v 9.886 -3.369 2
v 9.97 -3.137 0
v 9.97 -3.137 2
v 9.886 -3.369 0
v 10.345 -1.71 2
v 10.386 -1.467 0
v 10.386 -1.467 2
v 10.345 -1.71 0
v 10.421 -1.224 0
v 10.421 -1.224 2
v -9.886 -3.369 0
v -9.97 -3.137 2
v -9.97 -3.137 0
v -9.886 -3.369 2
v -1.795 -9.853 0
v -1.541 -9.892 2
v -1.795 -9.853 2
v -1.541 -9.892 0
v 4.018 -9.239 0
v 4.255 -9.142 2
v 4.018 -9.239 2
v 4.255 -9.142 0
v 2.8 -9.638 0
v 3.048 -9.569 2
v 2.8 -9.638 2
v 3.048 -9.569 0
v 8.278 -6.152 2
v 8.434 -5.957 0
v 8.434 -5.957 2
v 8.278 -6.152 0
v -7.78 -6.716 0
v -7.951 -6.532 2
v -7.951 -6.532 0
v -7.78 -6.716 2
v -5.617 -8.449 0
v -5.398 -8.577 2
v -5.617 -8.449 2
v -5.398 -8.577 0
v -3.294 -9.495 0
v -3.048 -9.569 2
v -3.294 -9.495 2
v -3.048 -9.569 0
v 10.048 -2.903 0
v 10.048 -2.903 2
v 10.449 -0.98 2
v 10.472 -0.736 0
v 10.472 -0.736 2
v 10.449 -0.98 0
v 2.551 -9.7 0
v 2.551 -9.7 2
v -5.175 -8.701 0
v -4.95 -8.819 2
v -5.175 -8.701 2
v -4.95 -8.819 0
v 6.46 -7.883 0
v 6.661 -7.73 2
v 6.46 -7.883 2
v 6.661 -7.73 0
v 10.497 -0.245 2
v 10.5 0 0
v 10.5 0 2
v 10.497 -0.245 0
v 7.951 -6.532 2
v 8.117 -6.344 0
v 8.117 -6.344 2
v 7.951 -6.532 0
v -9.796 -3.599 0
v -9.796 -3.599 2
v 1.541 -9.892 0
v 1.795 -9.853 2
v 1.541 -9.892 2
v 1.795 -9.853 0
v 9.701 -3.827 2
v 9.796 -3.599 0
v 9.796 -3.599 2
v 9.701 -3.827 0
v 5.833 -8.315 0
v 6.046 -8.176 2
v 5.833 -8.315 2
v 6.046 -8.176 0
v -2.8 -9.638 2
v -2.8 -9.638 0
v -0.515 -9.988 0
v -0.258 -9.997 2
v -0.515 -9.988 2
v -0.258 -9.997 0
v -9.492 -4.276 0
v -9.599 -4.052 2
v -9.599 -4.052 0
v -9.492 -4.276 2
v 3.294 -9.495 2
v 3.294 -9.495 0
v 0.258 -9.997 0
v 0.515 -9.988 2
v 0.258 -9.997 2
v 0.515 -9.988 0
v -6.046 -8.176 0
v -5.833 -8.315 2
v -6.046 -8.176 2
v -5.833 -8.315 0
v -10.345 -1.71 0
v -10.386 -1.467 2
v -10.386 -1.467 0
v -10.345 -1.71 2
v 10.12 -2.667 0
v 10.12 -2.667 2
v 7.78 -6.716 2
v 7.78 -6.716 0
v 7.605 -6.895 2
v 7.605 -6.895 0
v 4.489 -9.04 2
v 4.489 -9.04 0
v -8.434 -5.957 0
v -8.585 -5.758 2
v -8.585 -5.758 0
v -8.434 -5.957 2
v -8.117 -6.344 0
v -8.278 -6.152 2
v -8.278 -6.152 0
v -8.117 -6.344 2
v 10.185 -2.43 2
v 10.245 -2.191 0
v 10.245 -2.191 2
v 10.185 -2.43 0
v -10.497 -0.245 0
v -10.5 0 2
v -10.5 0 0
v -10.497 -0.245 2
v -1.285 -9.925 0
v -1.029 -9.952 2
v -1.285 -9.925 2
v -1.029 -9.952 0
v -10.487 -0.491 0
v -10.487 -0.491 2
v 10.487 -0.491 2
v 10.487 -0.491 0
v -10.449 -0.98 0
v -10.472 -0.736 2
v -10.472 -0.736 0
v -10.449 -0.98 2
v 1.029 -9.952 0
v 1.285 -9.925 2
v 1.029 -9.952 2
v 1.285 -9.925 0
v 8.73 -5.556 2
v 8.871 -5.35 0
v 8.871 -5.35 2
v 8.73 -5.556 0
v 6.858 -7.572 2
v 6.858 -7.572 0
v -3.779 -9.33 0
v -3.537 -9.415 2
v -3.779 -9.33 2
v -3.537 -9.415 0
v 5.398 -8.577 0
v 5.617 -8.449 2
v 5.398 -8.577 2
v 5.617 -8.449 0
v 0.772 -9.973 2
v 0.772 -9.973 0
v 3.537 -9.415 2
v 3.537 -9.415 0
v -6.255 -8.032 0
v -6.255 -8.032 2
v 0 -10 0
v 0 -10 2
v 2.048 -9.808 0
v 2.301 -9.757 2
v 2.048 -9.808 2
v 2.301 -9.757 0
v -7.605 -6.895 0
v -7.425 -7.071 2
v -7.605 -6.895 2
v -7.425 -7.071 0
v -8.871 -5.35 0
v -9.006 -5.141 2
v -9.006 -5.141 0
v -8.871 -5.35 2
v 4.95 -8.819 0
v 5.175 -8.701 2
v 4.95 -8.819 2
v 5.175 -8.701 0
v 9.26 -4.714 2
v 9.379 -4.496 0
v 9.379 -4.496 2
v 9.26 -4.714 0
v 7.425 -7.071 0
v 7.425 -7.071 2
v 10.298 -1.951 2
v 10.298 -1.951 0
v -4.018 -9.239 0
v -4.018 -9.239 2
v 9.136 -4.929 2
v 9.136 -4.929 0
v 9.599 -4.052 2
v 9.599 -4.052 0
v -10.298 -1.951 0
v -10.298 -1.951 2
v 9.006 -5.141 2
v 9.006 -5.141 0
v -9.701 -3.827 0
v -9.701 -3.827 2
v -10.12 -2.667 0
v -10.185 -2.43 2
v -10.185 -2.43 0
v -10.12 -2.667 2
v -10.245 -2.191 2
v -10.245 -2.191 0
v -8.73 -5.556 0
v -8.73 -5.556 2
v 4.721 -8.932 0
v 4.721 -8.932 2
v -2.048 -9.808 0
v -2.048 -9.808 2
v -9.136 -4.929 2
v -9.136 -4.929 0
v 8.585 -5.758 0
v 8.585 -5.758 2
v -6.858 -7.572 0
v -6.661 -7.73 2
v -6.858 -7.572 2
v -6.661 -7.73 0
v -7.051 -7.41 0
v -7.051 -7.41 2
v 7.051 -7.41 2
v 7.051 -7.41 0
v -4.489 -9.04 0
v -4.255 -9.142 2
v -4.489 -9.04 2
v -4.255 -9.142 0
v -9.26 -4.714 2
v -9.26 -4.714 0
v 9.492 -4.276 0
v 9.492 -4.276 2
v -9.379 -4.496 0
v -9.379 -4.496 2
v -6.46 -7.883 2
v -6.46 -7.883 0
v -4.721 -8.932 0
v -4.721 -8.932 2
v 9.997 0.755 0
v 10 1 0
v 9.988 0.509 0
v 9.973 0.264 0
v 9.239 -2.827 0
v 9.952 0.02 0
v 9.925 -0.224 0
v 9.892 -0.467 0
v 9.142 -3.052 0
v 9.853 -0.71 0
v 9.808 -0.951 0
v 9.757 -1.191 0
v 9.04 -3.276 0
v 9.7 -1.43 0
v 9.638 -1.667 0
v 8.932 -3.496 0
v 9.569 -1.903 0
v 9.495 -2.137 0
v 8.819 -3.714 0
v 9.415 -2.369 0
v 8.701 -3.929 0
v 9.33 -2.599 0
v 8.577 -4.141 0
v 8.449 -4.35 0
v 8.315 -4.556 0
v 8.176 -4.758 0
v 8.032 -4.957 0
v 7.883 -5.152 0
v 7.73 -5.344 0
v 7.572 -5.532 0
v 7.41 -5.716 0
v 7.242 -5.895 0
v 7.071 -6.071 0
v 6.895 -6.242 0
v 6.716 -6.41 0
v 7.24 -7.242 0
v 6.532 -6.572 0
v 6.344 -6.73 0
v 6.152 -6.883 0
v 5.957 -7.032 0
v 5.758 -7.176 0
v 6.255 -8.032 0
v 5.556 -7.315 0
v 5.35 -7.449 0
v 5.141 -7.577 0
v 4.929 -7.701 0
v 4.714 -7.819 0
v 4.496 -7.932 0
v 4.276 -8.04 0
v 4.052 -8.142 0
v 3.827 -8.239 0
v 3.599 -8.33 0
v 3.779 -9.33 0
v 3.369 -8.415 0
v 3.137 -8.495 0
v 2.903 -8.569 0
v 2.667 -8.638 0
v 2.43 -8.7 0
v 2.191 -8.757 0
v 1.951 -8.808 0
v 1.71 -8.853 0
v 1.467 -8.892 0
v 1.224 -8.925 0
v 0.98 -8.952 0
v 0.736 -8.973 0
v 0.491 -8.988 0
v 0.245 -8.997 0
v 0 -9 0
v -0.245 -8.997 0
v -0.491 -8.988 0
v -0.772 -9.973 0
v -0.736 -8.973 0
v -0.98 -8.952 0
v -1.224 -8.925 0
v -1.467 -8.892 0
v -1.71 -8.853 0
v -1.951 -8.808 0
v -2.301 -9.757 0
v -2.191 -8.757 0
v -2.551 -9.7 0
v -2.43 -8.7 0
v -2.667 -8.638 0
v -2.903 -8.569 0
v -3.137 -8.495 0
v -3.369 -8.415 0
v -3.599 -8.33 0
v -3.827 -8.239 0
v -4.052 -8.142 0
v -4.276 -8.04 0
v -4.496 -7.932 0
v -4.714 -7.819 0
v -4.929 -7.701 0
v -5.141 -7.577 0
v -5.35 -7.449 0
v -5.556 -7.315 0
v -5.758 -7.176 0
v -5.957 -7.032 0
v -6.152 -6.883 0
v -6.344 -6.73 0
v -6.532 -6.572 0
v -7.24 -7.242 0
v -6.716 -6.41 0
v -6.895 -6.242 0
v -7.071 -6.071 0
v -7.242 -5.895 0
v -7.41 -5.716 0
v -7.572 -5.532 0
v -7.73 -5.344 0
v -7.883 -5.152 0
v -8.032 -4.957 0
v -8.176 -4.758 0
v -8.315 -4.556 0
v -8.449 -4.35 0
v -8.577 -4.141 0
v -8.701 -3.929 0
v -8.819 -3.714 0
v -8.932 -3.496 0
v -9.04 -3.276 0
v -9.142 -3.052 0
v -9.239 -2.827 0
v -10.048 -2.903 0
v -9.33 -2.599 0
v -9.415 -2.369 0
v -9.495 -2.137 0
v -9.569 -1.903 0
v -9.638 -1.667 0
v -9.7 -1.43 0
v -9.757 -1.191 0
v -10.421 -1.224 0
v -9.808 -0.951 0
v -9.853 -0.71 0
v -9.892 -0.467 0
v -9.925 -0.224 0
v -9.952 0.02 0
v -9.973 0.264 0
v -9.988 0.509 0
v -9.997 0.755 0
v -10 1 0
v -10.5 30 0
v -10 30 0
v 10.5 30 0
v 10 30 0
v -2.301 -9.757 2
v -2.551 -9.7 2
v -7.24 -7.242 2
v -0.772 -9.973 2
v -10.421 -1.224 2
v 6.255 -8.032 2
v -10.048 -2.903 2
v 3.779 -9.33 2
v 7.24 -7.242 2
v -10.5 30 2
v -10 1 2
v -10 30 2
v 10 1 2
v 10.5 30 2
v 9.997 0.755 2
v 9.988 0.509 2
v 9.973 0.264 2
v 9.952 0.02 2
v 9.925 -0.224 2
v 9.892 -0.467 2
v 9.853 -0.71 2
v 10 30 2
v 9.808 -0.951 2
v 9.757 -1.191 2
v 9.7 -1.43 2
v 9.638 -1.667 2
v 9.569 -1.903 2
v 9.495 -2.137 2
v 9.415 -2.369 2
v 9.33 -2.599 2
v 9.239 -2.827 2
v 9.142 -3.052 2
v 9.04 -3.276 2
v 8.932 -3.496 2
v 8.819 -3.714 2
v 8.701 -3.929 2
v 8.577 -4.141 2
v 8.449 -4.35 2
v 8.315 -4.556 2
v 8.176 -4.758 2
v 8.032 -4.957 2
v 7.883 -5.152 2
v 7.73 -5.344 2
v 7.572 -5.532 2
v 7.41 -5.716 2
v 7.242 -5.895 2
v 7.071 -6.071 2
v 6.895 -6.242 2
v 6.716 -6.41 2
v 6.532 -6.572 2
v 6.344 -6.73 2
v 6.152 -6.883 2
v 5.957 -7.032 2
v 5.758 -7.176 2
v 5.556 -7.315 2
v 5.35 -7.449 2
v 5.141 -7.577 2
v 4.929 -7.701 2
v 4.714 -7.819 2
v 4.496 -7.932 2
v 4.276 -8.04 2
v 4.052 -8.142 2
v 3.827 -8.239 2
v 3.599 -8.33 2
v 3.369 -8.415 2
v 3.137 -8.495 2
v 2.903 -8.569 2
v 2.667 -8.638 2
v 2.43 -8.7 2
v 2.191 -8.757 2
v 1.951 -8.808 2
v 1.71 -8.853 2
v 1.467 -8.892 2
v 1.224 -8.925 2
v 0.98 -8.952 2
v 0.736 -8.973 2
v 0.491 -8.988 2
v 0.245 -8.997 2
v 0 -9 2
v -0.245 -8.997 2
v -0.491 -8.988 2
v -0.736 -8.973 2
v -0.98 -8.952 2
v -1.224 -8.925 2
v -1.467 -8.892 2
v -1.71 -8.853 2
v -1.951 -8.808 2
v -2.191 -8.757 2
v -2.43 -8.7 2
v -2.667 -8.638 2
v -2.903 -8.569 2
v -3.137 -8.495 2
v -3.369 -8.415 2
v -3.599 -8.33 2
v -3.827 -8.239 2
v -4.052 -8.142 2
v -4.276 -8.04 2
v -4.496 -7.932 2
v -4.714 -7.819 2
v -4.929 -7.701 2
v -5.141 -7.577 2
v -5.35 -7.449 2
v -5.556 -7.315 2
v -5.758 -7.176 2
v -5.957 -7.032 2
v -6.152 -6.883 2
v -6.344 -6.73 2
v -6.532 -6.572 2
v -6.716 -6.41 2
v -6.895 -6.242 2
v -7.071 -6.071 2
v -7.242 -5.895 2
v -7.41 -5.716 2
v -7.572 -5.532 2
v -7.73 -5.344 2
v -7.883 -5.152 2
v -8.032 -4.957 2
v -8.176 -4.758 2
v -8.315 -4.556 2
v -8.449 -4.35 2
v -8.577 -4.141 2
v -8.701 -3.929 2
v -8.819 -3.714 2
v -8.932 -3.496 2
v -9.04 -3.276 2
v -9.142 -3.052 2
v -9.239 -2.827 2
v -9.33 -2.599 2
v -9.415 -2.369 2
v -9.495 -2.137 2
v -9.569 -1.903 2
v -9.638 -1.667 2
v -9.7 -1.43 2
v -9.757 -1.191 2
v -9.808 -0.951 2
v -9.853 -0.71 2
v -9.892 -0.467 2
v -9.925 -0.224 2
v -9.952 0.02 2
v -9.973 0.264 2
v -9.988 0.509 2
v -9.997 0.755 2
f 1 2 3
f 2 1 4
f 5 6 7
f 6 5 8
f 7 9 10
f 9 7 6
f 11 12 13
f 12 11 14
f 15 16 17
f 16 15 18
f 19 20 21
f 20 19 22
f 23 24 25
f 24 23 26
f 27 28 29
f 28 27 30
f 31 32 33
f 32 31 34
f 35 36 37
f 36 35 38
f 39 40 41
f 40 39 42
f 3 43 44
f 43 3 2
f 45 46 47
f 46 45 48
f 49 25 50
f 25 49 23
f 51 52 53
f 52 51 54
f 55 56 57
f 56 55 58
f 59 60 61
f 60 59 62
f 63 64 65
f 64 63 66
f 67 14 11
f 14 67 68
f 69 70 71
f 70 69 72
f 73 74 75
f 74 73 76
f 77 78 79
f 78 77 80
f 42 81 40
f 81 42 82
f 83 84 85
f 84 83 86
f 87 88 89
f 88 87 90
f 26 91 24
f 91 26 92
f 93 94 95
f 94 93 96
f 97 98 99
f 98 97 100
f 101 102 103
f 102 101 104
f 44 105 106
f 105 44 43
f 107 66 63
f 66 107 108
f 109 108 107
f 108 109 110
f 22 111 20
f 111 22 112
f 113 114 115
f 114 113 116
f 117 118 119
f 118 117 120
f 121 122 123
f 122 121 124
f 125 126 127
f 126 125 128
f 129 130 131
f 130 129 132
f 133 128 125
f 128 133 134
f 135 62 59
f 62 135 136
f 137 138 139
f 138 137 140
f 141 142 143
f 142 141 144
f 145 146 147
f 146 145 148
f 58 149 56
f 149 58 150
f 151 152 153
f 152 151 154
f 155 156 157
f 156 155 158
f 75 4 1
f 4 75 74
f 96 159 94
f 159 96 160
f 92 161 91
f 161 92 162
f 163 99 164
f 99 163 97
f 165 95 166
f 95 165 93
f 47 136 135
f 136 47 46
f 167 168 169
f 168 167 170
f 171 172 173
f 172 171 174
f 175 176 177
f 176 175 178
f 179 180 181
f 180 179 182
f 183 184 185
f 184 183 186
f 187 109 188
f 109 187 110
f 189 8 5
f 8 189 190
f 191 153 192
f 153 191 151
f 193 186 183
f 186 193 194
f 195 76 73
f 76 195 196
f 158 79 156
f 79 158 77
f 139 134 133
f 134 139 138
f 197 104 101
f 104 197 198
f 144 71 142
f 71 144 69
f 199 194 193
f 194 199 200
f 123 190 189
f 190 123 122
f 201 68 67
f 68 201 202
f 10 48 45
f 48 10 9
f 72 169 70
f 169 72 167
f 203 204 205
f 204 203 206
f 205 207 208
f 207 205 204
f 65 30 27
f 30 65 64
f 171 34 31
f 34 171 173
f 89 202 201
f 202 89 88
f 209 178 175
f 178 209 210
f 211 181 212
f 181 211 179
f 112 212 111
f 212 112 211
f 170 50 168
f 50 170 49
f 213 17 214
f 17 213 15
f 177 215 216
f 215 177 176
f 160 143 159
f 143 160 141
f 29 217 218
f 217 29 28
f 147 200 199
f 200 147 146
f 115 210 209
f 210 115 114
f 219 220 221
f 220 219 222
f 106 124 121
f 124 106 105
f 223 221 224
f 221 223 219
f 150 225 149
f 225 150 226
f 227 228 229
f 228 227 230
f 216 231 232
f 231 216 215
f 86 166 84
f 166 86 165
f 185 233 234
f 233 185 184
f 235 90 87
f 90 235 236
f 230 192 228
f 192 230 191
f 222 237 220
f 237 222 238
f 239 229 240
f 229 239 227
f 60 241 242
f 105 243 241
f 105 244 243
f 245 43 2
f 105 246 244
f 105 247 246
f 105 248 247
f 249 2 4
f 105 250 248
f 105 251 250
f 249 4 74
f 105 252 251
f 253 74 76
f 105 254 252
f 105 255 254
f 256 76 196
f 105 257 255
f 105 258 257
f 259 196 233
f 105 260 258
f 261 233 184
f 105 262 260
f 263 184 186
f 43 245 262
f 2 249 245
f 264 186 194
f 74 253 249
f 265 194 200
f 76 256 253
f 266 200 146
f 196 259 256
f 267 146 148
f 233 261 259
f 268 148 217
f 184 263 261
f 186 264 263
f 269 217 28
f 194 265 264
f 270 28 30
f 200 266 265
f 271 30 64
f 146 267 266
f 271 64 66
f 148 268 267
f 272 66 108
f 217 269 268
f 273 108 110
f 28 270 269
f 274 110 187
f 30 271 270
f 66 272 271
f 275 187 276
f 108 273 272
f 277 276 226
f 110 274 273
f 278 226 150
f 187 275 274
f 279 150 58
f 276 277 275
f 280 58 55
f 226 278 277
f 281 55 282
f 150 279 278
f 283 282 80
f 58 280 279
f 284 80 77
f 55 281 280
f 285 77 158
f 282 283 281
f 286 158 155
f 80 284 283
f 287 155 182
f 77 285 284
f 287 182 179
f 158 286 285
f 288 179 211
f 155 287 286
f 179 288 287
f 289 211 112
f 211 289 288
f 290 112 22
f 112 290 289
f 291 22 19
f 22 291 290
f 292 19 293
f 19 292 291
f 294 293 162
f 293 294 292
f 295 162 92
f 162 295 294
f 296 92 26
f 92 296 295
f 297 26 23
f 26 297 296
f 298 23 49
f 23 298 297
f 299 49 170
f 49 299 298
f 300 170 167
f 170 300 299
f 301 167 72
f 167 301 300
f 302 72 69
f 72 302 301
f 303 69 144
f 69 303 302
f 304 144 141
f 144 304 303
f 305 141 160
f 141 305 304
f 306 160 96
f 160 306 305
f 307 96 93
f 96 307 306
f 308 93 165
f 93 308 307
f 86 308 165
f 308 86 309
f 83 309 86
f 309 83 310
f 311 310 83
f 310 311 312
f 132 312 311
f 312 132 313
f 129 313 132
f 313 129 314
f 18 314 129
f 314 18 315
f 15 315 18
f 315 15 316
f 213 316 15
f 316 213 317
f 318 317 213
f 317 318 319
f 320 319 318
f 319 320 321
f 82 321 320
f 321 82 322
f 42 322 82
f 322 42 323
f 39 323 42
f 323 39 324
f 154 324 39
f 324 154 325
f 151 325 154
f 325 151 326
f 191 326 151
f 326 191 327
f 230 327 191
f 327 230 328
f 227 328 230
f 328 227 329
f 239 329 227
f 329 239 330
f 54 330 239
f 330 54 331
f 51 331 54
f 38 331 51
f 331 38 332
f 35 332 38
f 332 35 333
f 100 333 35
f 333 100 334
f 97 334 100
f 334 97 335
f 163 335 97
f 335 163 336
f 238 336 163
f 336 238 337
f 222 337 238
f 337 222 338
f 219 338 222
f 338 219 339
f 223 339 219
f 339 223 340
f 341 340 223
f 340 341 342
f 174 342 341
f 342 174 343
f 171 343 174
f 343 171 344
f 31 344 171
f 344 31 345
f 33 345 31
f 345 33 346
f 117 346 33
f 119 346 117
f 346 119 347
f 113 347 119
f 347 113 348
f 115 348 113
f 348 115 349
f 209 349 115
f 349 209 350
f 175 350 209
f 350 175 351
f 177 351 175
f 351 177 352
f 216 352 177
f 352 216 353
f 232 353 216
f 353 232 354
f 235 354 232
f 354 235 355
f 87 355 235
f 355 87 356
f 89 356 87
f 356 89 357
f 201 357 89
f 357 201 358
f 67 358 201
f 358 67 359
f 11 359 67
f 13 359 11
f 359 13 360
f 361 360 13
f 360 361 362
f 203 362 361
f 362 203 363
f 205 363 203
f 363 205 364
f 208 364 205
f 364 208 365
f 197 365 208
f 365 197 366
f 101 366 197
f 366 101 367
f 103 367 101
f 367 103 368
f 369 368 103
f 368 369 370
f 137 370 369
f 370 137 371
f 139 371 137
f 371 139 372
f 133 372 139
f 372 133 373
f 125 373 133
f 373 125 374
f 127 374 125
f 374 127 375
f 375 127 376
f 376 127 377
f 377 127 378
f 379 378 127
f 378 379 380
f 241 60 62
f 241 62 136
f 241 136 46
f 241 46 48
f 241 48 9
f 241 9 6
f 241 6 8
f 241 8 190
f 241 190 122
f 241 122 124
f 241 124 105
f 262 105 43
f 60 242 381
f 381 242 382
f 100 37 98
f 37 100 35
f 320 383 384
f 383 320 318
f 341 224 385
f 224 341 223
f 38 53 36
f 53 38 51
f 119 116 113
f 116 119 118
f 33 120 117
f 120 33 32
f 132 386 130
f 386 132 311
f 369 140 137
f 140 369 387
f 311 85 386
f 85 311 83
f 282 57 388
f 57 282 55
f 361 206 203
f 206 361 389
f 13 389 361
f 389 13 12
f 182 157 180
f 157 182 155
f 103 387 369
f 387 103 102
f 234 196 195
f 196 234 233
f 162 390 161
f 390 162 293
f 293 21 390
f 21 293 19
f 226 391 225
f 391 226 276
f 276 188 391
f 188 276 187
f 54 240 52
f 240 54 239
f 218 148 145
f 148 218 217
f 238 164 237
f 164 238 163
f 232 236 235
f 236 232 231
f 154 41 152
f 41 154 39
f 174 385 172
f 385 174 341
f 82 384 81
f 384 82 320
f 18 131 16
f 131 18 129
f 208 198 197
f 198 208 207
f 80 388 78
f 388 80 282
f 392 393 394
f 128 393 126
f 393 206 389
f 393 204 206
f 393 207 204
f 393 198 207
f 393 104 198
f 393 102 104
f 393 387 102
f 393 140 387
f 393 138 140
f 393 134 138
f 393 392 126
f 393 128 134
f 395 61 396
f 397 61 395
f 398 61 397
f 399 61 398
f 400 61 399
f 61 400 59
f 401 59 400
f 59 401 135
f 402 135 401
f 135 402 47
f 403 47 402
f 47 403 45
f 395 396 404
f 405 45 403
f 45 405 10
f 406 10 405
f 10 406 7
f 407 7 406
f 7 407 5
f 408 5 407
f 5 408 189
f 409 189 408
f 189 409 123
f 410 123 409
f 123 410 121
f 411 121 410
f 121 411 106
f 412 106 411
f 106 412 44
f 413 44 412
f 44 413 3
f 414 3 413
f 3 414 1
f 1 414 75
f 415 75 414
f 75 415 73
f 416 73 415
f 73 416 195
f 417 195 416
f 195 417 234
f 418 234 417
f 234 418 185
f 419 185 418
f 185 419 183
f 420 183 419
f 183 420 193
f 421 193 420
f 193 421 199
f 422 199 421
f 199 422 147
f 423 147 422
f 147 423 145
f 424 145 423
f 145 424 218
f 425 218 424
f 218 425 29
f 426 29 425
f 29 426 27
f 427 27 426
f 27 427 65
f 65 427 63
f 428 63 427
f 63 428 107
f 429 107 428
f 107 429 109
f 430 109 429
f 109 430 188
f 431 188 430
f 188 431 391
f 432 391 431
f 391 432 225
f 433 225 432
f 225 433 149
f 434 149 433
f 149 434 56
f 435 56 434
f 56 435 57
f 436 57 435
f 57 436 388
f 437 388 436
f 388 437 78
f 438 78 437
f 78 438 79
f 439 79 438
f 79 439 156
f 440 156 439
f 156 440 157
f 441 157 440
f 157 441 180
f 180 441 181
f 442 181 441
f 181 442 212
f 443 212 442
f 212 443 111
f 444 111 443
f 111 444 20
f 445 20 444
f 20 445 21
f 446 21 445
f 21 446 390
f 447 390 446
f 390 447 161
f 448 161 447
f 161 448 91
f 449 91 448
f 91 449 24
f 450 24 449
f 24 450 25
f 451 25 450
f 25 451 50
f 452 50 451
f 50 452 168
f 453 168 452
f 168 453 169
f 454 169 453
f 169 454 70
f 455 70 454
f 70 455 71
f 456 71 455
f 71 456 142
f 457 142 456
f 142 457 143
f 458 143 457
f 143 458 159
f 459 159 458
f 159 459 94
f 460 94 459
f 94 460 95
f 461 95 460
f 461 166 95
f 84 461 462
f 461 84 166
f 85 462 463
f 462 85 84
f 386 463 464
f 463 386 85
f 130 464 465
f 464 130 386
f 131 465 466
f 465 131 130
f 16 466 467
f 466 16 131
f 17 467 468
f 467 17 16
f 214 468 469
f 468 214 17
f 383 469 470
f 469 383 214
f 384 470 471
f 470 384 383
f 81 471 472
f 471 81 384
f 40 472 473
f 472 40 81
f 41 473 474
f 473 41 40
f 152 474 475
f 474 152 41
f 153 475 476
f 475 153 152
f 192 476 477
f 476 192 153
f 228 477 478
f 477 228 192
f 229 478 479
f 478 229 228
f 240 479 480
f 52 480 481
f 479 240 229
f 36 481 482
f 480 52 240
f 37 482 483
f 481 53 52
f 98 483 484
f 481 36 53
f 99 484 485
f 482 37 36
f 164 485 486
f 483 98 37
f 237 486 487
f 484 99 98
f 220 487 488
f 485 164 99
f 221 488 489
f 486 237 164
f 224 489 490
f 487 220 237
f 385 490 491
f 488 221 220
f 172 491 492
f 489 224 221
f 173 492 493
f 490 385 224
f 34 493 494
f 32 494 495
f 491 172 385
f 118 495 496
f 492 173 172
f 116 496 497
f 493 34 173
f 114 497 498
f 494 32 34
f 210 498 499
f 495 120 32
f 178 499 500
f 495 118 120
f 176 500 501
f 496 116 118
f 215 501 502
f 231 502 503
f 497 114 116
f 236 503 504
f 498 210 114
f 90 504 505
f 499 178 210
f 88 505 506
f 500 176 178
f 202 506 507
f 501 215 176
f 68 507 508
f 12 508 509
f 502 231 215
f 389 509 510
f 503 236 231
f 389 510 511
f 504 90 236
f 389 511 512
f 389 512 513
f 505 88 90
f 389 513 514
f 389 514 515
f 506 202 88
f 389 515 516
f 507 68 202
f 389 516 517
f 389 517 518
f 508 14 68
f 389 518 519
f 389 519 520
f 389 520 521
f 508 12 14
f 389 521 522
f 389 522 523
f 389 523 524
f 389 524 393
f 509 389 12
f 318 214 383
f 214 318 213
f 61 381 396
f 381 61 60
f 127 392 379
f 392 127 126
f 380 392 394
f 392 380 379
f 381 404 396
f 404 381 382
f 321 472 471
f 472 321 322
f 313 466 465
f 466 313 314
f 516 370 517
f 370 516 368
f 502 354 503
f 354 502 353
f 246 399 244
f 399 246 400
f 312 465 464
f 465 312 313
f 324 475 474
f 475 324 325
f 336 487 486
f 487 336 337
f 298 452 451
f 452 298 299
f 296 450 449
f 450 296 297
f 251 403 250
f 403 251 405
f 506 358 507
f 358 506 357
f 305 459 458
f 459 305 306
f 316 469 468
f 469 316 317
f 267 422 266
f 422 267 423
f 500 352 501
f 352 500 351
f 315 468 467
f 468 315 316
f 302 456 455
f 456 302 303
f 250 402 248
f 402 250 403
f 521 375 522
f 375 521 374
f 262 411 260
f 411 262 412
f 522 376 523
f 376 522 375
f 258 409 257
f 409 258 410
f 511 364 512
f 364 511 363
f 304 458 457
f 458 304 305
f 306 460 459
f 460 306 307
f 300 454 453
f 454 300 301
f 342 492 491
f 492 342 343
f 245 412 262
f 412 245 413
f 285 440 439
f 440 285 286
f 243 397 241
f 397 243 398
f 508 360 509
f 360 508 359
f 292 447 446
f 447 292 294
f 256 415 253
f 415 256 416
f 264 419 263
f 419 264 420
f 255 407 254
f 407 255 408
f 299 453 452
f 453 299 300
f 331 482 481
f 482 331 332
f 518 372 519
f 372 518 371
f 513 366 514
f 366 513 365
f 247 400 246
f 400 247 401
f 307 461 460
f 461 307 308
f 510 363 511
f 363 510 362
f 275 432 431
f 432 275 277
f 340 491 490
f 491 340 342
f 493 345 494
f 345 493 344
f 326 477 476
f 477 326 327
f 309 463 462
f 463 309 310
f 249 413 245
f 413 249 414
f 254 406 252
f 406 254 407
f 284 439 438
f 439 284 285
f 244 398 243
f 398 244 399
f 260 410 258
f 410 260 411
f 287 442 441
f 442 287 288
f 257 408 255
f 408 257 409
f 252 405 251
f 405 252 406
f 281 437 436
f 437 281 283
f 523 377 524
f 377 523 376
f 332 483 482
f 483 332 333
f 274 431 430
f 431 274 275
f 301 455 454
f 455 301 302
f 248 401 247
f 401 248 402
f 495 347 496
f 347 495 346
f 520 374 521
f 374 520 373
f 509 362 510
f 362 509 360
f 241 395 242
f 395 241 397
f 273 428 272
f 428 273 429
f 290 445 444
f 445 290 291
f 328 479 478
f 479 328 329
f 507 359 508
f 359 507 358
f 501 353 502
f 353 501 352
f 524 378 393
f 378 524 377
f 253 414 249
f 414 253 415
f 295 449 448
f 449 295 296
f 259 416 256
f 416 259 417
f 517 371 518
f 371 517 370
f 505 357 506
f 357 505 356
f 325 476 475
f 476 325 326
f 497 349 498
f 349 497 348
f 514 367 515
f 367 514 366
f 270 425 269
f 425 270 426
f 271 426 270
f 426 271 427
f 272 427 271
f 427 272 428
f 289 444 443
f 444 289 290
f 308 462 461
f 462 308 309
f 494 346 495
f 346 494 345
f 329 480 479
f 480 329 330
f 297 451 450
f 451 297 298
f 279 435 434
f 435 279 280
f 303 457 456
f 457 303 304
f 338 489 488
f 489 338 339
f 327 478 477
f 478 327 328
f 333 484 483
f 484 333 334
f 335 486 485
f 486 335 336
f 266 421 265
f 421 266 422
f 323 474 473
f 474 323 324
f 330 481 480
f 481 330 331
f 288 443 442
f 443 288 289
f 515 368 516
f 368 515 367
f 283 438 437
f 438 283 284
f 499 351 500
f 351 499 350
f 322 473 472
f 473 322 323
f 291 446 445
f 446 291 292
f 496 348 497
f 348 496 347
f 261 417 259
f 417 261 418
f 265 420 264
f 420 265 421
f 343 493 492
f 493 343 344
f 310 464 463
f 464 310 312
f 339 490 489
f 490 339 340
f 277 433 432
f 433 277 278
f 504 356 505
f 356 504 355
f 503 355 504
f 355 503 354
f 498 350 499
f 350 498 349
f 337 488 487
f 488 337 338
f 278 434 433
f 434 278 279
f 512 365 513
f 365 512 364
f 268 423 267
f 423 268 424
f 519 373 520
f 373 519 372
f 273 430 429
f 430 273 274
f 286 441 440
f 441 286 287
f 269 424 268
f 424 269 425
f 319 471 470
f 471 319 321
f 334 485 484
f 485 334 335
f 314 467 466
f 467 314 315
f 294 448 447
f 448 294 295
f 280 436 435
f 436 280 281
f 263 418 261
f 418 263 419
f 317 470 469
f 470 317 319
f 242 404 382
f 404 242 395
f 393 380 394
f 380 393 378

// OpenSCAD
difference(){
    
scale([1.05,1,1]){
cylinder(d=20, h=2, $fn=256);
translate([-10,0,0]){
    cube([20,30,2]);
}
}
translate([0,1,0]){
cylinder(d=20, h=2, $fn=256);
translate([-10,0,0]){
    cube([20,30,2]);
}
}
}
